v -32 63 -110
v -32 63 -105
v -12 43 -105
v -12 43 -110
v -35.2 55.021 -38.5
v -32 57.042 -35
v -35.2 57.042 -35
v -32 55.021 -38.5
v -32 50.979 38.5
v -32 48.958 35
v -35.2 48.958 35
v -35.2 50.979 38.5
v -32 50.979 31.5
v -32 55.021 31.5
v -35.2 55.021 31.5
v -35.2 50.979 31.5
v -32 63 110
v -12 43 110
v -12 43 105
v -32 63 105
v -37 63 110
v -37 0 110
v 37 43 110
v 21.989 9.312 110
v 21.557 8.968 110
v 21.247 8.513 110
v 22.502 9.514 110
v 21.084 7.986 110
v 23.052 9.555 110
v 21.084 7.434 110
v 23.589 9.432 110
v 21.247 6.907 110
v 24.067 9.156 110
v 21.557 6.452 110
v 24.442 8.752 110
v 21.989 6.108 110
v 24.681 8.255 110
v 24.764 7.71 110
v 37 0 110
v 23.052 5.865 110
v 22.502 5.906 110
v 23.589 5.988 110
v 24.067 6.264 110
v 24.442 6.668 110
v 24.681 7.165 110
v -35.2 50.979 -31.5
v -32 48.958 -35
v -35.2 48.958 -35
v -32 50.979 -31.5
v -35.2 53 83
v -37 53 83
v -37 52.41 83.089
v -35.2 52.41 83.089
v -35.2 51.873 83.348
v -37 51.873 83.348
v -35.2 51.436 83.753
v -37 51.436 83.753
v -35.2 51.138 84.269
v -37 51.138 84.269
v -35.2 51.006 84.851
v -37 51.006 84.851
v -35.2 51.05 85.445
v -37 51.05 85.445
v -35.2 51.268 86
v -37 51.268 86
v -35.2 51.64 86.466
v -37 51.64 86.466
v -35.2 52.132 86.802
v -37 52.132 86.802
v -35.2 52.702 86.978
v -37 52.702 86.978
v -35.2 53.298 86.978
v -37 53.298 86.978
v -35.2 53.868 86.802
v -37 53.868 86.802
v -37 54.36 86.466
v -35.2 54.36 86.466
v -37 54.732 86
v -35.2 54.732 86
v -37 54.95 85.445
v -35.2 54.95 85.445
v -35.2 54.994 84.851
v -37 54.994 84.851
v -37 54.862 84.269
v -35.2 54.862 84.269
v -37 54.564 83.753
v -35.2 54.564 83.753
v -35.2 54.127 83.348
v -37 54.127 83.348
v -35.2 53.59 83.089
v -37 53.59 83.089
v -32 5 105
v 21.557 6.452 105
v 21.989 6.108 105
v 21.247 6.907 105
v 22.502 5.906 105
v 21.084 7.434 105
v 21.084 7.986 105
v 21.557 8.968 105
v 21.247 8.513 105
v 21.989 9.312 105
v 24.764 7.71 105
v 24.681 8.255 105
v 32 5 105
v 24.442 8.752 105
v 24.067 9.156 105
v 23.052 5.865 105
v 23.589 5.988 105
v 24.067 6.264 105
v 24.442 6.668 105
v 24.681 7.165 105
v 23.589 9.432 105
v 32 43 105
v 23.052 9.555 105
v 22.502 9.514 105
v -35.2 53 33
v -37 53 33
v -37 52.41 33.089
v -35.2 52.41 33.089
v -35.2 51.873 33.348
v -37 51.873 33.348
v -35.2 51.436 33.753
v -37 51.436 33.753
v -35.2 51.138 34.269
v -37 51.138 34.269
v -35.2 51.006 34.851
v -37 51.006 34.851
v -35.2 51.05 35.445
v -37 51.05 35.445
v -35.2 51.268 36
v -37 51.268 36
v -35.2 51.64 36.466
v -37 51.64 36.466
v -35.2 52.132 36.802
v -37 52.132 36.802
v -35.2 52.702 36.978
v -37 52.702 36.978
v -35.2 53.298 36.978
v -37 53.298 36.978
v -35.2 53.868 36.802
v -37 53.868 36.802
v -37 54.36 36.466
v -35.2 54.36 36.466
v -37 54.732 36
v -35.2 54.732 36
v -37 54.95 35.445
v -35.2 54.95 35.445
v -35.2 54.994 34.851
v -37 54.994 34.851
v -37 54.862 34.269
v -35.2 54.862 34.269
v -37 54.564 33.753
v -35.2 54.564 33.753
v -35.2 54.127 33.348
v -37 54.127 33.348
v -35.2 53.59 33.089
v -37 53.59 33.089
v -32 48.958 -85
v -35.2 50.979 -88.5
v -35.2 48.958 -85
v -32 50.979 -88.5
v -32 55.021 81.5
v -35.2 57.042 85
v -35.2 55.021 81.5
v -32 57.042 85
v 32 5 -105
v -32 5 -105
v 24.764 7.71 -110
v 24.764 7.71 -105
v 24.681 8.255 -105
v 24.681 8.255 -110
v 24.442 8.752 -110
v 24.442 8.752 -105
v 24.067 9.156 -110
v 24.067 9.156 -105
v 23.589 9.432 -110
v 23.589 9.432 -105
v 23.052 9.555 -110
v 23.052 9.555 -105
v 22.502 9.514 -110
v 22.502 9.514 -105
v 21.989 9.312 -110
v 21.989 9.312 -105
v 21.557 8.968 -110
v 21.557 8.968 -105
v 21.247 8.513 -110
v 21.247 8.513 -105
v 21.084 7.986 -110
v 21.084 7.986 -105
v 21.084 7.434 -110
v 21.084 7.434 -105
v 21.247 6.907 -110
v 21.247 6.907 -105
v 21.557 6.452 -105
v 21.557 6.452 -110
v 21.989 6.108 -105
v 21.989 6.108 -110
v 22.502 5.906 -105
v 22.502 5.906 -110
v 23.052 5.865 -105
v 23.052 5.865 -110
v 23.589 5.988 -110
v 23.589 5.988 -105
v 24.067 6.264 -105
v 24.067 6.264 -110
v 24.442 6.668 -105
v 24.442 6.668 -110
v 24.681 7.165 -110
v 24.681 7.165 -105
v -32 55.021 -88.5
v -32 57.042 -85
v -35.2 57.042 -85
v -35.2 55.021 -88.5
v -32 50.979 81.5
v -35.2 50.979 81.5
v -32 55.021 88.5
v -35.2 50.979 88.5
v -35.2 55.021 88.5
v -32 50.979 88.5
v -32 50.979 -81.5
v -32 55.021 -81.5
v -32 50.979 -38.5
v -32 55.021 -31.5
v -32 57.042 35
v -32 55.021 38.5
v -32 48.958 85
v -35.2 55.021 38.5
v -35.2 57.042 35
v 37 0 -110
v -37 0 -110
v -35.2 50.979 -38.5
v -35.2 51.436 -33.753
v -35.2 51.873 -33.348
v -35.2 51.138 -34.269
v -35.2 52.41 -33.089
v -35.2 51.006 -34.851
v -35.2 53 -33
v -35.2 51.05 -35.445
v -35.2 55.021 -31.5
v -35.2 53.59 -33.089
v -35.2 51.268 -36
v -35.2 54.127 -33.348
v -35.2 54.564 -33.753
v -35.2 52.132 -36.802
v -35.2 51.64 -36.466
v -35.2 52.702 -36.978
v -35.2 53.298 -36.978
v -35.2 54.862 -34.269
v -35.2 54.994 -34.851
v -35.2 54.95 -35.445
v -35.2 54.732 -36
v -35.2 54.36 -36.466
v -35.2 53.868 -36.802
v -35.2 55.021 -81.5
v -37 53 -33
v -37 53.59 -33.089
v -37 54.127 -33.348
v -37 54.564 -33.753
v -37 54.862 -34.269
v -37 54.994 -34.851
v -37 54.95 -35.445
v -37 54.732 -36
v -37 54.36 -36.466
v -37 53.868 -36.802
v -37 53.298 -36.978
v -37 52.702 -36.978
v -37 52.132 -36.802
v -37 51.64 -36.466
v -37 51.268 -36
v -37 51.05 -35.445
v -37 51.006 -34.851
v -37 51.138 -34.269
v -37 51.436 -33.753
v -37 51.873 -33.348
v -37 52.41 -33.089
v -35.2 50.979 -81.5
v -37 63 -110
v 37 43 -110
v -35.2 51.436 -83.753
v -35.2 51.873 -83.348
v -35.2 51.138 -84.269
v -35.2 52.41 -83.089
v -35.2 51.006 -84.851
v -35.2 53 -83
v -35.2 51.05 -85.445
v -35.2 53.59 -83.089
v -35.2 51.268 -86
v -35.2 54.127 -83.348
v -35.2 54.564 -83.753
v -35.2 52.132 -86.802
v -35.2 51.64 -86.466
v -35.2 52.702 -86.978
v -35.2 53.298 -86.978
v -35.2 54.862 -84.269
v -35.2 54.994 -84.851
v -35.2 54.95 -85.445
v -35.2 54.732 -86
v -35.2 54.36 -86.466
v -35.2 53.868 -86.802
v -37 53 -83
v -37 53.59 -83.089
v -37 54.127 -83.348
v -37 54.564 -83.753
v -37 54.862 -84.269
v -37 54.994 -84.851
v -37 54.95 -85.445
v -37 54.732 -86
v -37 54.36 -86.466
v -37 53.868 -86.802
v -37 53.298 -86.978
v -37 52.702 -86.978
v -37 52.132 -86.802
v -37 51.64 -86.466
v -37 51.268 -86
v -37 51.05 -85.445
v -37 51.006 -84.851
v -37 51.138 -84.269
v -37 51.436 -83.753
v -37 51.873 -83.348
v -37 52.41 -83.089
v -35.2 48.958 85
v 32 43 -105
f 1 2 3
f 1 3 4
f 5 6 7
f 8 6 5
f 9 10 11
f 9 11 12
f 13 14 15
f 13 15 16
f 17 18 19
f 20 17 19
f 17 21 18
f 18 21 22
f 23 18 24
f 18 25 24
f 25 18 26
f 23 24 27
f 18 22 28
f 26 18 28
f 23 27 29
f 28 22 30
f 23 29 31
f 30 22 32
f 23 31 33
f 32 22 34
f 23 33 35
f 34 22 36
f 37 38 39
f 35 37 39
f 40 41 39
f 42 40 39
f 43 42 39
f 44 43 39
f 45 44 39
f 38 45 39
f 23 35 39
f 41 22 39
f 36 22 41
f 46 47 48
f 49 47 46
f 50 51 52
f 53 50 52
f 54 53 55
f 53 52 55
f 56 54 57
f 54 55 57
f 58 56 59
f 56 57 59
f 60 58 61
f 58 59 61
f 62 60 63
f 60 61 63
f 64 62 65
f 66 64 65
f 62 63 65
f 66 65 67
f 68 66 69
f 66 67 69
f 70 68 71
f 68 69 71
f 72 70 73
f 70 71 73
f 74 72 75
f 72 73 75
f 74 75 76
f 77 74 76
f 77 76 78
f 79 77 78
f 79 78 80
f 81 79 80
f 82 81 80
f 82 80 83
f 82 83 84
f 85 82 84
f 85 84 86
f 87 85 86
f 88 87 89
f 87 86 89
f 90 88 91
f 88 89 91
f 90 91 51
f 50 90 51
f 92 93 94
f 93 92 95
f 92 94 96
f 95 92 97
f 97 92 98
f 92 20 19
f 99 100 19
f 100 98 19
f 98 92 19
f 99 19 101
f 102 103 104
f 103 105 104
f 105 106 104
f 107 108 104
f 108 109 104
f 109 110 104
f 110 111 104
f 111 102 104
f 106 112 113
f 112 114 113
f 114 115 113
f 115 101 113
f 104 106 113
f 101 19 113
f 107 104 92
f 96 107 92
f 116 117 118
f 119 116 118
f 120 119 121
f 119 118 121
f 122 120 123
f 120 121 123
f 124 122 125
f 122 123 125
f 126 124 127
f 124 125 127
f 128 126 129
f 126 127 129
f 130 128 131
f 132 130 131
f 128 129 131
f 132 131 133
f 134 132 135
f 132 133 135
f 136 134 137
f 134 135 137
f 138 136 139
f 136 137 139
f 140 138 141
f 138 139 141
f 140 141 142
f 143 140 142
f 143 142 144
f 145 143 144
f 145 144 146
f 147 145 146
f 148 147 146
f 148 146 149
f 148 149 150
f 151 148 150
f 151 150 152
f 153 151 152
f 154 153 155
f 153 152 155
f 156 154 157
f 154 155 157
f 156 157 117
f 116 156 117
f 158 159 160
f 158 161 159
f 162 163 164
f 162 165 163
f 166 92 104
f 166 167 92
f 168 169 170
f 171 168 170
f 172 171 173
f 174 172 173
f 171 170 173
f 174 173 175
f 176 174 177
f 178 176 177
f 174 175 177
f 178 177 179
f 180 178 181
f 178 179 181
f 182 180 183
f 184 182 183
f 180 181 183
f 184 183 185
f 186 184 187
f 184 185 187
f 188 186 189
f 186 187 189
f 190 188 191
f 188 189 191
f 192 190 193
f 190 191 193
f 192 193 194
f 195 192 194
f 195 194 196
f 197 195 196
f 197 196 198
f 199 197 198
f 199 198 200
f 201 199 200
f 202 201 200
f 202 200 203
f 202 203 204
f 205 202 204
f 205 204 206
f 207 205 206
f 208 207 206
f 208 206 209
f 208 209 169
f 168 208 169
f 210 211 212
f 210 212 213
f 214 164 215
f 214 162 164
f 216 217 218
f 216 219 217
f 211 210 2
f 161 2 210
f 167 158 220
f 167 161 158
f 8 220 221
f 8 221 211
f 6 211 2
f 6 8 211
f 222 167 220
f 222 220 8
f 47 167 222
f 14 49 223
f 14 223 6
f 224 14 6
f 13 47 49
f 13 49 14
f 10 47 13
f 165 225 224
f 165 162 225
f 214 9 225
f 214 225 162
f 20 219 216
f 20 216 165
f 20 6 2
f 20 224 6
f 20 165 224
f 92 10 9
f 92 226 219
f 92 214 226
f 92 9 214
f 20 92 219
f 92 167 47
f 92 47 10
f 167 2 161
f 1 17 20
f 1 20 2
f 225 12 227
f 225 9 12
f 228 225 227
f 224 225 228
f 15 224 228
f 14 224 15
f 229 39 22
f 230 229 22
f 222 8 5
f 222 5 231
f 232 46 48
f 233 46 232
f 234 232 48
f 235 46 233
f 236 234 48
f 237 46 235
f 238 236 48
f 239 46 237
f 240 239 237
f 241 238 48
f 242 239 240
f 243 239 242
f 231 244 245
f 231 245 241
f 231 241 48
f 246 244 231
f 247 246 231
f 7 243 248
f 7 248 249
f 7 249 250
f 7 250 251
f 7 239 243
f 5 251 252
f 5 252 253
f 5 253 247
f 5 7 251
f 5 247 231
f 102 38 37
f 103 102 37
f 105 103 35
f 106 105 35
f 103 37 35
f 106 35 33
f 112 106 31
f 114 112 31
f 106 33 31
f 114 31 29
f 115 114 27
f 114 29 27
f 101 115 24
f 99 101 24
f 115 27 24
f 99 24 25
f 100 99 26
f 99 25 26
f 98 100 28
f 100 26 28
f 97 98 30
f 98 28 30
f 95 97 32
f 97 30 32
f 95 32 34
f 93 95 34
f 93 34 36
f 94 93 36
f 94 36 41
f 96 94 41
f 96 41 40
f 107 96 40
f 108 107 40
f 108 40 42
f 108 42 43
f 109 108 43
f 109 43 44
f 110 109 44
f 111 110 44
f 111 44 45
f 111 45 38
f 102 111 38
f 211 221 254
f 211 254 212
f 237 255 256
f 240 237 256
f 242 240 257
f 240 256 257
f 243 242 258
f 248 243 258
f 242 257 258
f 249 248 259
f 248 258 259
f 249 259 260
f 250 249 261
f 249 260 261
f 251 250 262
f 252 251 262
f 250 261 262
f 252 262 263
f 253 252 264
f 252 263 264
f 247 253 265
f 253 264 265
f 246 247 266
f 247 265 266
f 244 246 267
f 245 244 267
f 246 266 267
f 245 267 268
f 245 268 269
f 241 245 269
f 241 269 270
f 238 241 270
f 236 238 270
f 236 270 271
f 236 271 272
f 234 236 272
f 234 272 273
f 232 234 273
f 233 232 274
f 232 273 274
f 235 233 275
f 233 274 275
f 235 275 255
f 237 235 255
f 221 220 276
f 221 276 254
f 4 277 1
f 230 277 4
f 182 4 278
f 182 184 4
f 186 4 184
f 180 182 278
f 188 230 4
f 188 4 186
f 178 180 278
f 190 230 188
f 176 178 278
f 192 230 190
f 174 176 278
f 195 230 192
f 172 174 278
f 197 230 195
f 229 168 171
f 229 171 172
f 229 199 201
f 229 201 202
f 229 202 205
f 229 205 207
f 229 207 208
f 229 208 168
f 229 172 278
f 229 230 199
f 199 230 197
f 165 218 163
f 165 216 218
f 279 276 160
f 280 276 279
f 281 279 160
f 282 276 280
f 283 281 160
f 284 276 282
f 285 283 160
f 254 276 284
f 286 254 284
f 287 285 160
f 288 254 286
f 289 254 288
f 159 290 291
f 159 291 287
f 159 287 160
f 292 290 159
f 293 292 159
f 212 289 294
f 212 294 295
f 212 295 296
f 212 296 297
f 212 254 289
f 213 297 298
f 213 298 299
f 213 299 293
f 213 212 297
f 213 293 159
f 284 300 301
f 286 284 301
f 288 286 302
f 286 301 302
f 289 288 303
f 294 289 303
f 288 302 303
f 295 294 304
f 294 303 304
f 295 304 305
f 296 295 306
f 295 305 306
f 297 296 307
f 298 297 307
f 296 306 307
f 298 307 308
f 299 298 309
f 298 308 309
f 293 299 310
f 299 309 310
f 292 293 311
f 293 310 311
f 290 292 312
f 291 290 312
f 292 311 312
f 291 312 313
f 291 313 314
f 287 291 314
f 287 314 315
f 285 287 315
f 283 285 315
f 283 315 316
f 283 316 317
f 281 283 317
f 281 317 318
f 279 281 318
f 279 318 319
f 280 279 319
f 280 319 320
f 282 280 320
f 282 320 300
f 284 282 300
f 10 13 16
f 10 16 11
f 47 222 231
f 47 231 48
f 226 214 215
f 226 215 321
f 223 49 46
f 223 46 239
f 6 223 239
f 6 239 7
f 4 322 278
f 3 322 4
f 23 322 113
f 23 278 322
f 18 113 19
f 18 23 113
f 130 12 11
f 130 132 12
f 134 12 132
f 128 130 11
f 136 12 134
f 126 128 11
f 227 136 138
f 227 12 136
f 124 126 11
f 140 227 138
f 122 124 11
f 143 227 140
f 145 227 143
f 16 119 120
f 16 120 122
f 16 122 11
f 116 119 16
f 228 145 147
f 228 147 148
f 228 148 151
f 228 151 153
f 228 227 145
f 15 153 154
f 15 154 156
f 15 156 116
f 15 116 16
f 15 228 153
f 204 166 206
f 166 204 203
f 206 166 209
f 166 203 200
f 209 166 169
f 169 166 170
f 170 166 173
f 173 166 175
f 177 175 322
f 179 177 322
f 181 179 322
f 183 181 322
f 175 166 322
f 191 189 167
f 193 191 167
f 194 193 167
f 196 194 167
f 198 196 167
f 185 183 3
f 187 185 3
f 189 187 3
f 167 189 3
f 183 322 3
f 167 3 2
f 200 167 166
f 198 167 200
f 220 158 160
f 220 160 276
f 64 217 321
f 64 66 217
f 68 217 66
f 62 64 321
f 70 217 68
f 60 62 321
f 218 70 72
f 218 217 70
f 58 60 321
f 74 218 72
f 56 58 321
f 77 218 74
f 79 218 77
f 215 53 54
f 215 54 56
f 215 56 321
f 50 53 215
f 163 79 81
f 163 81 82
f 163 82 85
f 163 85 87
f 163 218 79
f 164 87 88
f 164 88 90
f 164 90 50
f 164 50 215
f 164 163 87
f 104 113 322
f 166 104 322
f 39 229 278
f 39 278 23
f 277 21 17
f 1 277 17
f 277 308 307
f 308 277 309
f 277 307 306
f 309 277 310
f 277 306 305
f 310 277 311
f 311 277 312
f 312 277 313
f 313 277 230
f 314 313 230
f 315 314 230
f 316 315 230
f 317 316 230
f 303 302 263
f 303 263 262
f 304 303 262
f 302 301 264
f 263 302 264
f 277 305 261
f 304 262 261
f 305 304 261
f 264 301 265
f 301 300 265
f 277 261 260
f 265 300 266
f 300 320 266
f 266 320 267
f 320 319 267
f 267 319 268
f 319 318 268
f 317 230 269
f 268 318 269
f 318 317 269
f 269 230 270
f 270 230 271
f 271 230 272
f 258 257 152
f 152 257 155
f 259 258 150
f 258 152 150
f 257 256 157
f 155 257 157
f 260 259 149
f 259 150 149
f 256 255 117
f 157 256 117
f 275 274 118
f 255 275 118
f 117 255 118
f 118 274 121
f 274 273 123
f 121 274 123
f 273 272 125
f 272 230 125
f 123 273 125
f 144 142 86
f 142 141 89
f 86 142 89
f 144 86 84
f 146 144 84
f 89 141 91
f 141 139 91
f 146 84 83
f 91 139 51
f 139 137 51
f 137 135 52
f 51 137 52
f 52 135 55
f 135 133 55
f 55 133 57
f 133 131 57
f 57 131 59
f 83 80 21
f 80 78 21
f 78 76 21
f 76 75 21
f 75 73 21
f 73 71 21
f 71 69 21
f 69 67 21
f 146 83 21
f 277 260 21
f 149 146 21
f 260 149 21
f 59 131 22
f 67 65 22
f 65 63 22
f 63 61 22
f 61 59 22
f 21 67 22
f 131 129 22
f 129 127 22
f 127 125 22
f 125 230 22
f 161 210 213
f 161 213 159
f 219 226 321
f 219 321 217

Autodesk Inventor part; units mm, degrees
ref_plane "YZ Plane" through (0, 0, 0) normal (1, 0, 0) x (0, 1, 0)
ref_plane "XZ Plane" through (0, 0, 0) normal (0, 1, 0) x (-1, 0, 0)
ref_plane "XY Plane" through (0, 0, 0) normal (0, 0, 1) x (1, 0, 0)
sketch "Эскиз1" plane through (0, 0, 0) normal (0, 1, 0) x (-1, 0, 0)
  line L0 (-37, 110) -> (37, 110)
  line L1 (37, 110) -> (37, -110)
  line L2 (37, -110) -> (-37, -110)
  line L3 (-37, -110) -> (-37, 110)
  line L4 (-37, 110) -> (37, -110) construction
  line L5 (37, 110) -> (-37, -110) construction
  point P0 (0, 0)
  dimension "d0" = 74
  dimension "d1" = 220
extrude "Выдавливание1" add sketch "Эскиз1" along normal blind 43
sketch "Эскиз3" plane through (0, 43, 0) normal (0, 1, 0) x (1, 0, 0)
  line L0 (-32, -105) -> (32, -105)
  line L1 (32, -105) -> (32, 105)
  line L2 (32, 105) -> (-32, 105)
  line L3 (-32, 105) -> (-32, -105)
  line L4 (-32, -105) -> (32, 105) construction
  line L5 (32, -105) -> (-32, 105) construction
  line L6 (37, 110) -> (-37, 110) projected
  line L7 (-37, 110) -> (-37, -110) projected
  point P0 (0, 0)
  dimension "d4" = 5
  dimension "d5" = 5
extrude "Выдавливание2" cut sketch "Эскиз3" against normal blind 38
sketch "Эскиз4" plane through (0, 5, 0) normal (0, 1, 0) x (1, 0, 0)
  line L0 (32, 105) -> (32, -105) projected
  line L1 (32, 105) -> (0, 105)
  line L2 (0, 105) -> (0, 67.1211)
  line L3 (0, 67.1211) -> (32, 67.1211)
  line L4 (32, 67.1211) -> (32, 105)
  point P0 (0, 0)
sketch "Эскиз5" plane through (0, 43, 0) normal (0, 1, 0) x (1, 0, 0)
  line L0 (-37, 110) -> (-37, -110) projected
  line L1 (-37, -110) -> (37, -110) projected
  line L2 (-37, 110) -> (-32, 110)
  line L3 (-32, 110) -> (-32, -110)
  line L4 (-32, -110) -> (-37, -110)
  line L5 (-37, -110) -> (-37, 110)
  line L6 (-32, -105) -> (-32, 105) projected
  point P0 (0, 0)
  point P1 (-32, 0)
extrude "Выдавливание3" add sketch "Эскиз5" along normal blind 20
chamfer "Фаска1" distance 20 angle 45 2 edges at (-32, 43, -107.5) (-32, 43, 107.5)
sketch "Эскиз6" plane through (-37, 0, -110) normal (-1, 0, 0) x (0, 0, 1)
  circle A0 centre (25, 53) radius 2
  circle A1 centre (75, 53) radius 2
  line L0 (0, 63) -> (220, 63) projected
  point P0 (110, 0)
  dimension "d13" = 4
  dimension "d14" = 4
  dimension "d15" = 10
  dimension "d16" = 50
  dimension "d19" = 35
extrude "Выдавливание4" cut sketch "Эскиз6" against normal blind 10
mirror "Зеркальное отражение1" about plane through (0, 0, 0) normal (0, 0, 1) of "Выдавливание4"
sketch "Эскиз7" plane through (-37, 0, 110) normal (0, 0, 1) x (1, 0, 0)
  circle A0 centre (59.9136, 7.71) radius 1.85 projected
  point P0 (37, 0)
extrude "Выдавливание5" cut sketch "Эскиз7" against normal through all
sketch "Эскиз8" plane through (-32, 5, 105) normal (1, 0, 0) x (0, 0, -1)
  circle A0 centre (20, 48) radius 2 projected
  line L0 (20, 52.0415) -> (23.5, 50.0207)
  line L1 (23.5, 50.0207) -> (23.5, 45.9793)
  line L2 (23.5, 45.9793) -> (20, 43.9585)
  line L3 (20, 43.9585) -> (16.5, 45.9793)
  line L4 (16.5, 45.9793) -> (16.5, 50.0207)
  line L5 (16.5, 50.0207) -> (20, 52.0415)
  point P0 (105, -5)
  dimension "d22" = 7
extrude "Выдавливание6" cut sketch "Эскиз8" against normal blind 3.2 contours A0 | L0 L1 L2 L3 L4 L5
sketch "Эскиз9" plane through (-32, 5, 105) normal (1, 0, 0) x (0, 0, -1)
  circle A0 centre (70, 48) radius 2 projected
  circle A1 centre (140, 48) radius 2 projected
  circle A2 centre (190, 48) radius 2 projected
  point P0 (105, -5)
pattern_sketch "Массив по эскизу1" of "Выдавливание6" from (-32, 53, 85) copies at (-32, 53, 35) at (-32, 53, -35) at (-32, 53, -85)
properties part number "KB33-046-008-001 - Корпус"
